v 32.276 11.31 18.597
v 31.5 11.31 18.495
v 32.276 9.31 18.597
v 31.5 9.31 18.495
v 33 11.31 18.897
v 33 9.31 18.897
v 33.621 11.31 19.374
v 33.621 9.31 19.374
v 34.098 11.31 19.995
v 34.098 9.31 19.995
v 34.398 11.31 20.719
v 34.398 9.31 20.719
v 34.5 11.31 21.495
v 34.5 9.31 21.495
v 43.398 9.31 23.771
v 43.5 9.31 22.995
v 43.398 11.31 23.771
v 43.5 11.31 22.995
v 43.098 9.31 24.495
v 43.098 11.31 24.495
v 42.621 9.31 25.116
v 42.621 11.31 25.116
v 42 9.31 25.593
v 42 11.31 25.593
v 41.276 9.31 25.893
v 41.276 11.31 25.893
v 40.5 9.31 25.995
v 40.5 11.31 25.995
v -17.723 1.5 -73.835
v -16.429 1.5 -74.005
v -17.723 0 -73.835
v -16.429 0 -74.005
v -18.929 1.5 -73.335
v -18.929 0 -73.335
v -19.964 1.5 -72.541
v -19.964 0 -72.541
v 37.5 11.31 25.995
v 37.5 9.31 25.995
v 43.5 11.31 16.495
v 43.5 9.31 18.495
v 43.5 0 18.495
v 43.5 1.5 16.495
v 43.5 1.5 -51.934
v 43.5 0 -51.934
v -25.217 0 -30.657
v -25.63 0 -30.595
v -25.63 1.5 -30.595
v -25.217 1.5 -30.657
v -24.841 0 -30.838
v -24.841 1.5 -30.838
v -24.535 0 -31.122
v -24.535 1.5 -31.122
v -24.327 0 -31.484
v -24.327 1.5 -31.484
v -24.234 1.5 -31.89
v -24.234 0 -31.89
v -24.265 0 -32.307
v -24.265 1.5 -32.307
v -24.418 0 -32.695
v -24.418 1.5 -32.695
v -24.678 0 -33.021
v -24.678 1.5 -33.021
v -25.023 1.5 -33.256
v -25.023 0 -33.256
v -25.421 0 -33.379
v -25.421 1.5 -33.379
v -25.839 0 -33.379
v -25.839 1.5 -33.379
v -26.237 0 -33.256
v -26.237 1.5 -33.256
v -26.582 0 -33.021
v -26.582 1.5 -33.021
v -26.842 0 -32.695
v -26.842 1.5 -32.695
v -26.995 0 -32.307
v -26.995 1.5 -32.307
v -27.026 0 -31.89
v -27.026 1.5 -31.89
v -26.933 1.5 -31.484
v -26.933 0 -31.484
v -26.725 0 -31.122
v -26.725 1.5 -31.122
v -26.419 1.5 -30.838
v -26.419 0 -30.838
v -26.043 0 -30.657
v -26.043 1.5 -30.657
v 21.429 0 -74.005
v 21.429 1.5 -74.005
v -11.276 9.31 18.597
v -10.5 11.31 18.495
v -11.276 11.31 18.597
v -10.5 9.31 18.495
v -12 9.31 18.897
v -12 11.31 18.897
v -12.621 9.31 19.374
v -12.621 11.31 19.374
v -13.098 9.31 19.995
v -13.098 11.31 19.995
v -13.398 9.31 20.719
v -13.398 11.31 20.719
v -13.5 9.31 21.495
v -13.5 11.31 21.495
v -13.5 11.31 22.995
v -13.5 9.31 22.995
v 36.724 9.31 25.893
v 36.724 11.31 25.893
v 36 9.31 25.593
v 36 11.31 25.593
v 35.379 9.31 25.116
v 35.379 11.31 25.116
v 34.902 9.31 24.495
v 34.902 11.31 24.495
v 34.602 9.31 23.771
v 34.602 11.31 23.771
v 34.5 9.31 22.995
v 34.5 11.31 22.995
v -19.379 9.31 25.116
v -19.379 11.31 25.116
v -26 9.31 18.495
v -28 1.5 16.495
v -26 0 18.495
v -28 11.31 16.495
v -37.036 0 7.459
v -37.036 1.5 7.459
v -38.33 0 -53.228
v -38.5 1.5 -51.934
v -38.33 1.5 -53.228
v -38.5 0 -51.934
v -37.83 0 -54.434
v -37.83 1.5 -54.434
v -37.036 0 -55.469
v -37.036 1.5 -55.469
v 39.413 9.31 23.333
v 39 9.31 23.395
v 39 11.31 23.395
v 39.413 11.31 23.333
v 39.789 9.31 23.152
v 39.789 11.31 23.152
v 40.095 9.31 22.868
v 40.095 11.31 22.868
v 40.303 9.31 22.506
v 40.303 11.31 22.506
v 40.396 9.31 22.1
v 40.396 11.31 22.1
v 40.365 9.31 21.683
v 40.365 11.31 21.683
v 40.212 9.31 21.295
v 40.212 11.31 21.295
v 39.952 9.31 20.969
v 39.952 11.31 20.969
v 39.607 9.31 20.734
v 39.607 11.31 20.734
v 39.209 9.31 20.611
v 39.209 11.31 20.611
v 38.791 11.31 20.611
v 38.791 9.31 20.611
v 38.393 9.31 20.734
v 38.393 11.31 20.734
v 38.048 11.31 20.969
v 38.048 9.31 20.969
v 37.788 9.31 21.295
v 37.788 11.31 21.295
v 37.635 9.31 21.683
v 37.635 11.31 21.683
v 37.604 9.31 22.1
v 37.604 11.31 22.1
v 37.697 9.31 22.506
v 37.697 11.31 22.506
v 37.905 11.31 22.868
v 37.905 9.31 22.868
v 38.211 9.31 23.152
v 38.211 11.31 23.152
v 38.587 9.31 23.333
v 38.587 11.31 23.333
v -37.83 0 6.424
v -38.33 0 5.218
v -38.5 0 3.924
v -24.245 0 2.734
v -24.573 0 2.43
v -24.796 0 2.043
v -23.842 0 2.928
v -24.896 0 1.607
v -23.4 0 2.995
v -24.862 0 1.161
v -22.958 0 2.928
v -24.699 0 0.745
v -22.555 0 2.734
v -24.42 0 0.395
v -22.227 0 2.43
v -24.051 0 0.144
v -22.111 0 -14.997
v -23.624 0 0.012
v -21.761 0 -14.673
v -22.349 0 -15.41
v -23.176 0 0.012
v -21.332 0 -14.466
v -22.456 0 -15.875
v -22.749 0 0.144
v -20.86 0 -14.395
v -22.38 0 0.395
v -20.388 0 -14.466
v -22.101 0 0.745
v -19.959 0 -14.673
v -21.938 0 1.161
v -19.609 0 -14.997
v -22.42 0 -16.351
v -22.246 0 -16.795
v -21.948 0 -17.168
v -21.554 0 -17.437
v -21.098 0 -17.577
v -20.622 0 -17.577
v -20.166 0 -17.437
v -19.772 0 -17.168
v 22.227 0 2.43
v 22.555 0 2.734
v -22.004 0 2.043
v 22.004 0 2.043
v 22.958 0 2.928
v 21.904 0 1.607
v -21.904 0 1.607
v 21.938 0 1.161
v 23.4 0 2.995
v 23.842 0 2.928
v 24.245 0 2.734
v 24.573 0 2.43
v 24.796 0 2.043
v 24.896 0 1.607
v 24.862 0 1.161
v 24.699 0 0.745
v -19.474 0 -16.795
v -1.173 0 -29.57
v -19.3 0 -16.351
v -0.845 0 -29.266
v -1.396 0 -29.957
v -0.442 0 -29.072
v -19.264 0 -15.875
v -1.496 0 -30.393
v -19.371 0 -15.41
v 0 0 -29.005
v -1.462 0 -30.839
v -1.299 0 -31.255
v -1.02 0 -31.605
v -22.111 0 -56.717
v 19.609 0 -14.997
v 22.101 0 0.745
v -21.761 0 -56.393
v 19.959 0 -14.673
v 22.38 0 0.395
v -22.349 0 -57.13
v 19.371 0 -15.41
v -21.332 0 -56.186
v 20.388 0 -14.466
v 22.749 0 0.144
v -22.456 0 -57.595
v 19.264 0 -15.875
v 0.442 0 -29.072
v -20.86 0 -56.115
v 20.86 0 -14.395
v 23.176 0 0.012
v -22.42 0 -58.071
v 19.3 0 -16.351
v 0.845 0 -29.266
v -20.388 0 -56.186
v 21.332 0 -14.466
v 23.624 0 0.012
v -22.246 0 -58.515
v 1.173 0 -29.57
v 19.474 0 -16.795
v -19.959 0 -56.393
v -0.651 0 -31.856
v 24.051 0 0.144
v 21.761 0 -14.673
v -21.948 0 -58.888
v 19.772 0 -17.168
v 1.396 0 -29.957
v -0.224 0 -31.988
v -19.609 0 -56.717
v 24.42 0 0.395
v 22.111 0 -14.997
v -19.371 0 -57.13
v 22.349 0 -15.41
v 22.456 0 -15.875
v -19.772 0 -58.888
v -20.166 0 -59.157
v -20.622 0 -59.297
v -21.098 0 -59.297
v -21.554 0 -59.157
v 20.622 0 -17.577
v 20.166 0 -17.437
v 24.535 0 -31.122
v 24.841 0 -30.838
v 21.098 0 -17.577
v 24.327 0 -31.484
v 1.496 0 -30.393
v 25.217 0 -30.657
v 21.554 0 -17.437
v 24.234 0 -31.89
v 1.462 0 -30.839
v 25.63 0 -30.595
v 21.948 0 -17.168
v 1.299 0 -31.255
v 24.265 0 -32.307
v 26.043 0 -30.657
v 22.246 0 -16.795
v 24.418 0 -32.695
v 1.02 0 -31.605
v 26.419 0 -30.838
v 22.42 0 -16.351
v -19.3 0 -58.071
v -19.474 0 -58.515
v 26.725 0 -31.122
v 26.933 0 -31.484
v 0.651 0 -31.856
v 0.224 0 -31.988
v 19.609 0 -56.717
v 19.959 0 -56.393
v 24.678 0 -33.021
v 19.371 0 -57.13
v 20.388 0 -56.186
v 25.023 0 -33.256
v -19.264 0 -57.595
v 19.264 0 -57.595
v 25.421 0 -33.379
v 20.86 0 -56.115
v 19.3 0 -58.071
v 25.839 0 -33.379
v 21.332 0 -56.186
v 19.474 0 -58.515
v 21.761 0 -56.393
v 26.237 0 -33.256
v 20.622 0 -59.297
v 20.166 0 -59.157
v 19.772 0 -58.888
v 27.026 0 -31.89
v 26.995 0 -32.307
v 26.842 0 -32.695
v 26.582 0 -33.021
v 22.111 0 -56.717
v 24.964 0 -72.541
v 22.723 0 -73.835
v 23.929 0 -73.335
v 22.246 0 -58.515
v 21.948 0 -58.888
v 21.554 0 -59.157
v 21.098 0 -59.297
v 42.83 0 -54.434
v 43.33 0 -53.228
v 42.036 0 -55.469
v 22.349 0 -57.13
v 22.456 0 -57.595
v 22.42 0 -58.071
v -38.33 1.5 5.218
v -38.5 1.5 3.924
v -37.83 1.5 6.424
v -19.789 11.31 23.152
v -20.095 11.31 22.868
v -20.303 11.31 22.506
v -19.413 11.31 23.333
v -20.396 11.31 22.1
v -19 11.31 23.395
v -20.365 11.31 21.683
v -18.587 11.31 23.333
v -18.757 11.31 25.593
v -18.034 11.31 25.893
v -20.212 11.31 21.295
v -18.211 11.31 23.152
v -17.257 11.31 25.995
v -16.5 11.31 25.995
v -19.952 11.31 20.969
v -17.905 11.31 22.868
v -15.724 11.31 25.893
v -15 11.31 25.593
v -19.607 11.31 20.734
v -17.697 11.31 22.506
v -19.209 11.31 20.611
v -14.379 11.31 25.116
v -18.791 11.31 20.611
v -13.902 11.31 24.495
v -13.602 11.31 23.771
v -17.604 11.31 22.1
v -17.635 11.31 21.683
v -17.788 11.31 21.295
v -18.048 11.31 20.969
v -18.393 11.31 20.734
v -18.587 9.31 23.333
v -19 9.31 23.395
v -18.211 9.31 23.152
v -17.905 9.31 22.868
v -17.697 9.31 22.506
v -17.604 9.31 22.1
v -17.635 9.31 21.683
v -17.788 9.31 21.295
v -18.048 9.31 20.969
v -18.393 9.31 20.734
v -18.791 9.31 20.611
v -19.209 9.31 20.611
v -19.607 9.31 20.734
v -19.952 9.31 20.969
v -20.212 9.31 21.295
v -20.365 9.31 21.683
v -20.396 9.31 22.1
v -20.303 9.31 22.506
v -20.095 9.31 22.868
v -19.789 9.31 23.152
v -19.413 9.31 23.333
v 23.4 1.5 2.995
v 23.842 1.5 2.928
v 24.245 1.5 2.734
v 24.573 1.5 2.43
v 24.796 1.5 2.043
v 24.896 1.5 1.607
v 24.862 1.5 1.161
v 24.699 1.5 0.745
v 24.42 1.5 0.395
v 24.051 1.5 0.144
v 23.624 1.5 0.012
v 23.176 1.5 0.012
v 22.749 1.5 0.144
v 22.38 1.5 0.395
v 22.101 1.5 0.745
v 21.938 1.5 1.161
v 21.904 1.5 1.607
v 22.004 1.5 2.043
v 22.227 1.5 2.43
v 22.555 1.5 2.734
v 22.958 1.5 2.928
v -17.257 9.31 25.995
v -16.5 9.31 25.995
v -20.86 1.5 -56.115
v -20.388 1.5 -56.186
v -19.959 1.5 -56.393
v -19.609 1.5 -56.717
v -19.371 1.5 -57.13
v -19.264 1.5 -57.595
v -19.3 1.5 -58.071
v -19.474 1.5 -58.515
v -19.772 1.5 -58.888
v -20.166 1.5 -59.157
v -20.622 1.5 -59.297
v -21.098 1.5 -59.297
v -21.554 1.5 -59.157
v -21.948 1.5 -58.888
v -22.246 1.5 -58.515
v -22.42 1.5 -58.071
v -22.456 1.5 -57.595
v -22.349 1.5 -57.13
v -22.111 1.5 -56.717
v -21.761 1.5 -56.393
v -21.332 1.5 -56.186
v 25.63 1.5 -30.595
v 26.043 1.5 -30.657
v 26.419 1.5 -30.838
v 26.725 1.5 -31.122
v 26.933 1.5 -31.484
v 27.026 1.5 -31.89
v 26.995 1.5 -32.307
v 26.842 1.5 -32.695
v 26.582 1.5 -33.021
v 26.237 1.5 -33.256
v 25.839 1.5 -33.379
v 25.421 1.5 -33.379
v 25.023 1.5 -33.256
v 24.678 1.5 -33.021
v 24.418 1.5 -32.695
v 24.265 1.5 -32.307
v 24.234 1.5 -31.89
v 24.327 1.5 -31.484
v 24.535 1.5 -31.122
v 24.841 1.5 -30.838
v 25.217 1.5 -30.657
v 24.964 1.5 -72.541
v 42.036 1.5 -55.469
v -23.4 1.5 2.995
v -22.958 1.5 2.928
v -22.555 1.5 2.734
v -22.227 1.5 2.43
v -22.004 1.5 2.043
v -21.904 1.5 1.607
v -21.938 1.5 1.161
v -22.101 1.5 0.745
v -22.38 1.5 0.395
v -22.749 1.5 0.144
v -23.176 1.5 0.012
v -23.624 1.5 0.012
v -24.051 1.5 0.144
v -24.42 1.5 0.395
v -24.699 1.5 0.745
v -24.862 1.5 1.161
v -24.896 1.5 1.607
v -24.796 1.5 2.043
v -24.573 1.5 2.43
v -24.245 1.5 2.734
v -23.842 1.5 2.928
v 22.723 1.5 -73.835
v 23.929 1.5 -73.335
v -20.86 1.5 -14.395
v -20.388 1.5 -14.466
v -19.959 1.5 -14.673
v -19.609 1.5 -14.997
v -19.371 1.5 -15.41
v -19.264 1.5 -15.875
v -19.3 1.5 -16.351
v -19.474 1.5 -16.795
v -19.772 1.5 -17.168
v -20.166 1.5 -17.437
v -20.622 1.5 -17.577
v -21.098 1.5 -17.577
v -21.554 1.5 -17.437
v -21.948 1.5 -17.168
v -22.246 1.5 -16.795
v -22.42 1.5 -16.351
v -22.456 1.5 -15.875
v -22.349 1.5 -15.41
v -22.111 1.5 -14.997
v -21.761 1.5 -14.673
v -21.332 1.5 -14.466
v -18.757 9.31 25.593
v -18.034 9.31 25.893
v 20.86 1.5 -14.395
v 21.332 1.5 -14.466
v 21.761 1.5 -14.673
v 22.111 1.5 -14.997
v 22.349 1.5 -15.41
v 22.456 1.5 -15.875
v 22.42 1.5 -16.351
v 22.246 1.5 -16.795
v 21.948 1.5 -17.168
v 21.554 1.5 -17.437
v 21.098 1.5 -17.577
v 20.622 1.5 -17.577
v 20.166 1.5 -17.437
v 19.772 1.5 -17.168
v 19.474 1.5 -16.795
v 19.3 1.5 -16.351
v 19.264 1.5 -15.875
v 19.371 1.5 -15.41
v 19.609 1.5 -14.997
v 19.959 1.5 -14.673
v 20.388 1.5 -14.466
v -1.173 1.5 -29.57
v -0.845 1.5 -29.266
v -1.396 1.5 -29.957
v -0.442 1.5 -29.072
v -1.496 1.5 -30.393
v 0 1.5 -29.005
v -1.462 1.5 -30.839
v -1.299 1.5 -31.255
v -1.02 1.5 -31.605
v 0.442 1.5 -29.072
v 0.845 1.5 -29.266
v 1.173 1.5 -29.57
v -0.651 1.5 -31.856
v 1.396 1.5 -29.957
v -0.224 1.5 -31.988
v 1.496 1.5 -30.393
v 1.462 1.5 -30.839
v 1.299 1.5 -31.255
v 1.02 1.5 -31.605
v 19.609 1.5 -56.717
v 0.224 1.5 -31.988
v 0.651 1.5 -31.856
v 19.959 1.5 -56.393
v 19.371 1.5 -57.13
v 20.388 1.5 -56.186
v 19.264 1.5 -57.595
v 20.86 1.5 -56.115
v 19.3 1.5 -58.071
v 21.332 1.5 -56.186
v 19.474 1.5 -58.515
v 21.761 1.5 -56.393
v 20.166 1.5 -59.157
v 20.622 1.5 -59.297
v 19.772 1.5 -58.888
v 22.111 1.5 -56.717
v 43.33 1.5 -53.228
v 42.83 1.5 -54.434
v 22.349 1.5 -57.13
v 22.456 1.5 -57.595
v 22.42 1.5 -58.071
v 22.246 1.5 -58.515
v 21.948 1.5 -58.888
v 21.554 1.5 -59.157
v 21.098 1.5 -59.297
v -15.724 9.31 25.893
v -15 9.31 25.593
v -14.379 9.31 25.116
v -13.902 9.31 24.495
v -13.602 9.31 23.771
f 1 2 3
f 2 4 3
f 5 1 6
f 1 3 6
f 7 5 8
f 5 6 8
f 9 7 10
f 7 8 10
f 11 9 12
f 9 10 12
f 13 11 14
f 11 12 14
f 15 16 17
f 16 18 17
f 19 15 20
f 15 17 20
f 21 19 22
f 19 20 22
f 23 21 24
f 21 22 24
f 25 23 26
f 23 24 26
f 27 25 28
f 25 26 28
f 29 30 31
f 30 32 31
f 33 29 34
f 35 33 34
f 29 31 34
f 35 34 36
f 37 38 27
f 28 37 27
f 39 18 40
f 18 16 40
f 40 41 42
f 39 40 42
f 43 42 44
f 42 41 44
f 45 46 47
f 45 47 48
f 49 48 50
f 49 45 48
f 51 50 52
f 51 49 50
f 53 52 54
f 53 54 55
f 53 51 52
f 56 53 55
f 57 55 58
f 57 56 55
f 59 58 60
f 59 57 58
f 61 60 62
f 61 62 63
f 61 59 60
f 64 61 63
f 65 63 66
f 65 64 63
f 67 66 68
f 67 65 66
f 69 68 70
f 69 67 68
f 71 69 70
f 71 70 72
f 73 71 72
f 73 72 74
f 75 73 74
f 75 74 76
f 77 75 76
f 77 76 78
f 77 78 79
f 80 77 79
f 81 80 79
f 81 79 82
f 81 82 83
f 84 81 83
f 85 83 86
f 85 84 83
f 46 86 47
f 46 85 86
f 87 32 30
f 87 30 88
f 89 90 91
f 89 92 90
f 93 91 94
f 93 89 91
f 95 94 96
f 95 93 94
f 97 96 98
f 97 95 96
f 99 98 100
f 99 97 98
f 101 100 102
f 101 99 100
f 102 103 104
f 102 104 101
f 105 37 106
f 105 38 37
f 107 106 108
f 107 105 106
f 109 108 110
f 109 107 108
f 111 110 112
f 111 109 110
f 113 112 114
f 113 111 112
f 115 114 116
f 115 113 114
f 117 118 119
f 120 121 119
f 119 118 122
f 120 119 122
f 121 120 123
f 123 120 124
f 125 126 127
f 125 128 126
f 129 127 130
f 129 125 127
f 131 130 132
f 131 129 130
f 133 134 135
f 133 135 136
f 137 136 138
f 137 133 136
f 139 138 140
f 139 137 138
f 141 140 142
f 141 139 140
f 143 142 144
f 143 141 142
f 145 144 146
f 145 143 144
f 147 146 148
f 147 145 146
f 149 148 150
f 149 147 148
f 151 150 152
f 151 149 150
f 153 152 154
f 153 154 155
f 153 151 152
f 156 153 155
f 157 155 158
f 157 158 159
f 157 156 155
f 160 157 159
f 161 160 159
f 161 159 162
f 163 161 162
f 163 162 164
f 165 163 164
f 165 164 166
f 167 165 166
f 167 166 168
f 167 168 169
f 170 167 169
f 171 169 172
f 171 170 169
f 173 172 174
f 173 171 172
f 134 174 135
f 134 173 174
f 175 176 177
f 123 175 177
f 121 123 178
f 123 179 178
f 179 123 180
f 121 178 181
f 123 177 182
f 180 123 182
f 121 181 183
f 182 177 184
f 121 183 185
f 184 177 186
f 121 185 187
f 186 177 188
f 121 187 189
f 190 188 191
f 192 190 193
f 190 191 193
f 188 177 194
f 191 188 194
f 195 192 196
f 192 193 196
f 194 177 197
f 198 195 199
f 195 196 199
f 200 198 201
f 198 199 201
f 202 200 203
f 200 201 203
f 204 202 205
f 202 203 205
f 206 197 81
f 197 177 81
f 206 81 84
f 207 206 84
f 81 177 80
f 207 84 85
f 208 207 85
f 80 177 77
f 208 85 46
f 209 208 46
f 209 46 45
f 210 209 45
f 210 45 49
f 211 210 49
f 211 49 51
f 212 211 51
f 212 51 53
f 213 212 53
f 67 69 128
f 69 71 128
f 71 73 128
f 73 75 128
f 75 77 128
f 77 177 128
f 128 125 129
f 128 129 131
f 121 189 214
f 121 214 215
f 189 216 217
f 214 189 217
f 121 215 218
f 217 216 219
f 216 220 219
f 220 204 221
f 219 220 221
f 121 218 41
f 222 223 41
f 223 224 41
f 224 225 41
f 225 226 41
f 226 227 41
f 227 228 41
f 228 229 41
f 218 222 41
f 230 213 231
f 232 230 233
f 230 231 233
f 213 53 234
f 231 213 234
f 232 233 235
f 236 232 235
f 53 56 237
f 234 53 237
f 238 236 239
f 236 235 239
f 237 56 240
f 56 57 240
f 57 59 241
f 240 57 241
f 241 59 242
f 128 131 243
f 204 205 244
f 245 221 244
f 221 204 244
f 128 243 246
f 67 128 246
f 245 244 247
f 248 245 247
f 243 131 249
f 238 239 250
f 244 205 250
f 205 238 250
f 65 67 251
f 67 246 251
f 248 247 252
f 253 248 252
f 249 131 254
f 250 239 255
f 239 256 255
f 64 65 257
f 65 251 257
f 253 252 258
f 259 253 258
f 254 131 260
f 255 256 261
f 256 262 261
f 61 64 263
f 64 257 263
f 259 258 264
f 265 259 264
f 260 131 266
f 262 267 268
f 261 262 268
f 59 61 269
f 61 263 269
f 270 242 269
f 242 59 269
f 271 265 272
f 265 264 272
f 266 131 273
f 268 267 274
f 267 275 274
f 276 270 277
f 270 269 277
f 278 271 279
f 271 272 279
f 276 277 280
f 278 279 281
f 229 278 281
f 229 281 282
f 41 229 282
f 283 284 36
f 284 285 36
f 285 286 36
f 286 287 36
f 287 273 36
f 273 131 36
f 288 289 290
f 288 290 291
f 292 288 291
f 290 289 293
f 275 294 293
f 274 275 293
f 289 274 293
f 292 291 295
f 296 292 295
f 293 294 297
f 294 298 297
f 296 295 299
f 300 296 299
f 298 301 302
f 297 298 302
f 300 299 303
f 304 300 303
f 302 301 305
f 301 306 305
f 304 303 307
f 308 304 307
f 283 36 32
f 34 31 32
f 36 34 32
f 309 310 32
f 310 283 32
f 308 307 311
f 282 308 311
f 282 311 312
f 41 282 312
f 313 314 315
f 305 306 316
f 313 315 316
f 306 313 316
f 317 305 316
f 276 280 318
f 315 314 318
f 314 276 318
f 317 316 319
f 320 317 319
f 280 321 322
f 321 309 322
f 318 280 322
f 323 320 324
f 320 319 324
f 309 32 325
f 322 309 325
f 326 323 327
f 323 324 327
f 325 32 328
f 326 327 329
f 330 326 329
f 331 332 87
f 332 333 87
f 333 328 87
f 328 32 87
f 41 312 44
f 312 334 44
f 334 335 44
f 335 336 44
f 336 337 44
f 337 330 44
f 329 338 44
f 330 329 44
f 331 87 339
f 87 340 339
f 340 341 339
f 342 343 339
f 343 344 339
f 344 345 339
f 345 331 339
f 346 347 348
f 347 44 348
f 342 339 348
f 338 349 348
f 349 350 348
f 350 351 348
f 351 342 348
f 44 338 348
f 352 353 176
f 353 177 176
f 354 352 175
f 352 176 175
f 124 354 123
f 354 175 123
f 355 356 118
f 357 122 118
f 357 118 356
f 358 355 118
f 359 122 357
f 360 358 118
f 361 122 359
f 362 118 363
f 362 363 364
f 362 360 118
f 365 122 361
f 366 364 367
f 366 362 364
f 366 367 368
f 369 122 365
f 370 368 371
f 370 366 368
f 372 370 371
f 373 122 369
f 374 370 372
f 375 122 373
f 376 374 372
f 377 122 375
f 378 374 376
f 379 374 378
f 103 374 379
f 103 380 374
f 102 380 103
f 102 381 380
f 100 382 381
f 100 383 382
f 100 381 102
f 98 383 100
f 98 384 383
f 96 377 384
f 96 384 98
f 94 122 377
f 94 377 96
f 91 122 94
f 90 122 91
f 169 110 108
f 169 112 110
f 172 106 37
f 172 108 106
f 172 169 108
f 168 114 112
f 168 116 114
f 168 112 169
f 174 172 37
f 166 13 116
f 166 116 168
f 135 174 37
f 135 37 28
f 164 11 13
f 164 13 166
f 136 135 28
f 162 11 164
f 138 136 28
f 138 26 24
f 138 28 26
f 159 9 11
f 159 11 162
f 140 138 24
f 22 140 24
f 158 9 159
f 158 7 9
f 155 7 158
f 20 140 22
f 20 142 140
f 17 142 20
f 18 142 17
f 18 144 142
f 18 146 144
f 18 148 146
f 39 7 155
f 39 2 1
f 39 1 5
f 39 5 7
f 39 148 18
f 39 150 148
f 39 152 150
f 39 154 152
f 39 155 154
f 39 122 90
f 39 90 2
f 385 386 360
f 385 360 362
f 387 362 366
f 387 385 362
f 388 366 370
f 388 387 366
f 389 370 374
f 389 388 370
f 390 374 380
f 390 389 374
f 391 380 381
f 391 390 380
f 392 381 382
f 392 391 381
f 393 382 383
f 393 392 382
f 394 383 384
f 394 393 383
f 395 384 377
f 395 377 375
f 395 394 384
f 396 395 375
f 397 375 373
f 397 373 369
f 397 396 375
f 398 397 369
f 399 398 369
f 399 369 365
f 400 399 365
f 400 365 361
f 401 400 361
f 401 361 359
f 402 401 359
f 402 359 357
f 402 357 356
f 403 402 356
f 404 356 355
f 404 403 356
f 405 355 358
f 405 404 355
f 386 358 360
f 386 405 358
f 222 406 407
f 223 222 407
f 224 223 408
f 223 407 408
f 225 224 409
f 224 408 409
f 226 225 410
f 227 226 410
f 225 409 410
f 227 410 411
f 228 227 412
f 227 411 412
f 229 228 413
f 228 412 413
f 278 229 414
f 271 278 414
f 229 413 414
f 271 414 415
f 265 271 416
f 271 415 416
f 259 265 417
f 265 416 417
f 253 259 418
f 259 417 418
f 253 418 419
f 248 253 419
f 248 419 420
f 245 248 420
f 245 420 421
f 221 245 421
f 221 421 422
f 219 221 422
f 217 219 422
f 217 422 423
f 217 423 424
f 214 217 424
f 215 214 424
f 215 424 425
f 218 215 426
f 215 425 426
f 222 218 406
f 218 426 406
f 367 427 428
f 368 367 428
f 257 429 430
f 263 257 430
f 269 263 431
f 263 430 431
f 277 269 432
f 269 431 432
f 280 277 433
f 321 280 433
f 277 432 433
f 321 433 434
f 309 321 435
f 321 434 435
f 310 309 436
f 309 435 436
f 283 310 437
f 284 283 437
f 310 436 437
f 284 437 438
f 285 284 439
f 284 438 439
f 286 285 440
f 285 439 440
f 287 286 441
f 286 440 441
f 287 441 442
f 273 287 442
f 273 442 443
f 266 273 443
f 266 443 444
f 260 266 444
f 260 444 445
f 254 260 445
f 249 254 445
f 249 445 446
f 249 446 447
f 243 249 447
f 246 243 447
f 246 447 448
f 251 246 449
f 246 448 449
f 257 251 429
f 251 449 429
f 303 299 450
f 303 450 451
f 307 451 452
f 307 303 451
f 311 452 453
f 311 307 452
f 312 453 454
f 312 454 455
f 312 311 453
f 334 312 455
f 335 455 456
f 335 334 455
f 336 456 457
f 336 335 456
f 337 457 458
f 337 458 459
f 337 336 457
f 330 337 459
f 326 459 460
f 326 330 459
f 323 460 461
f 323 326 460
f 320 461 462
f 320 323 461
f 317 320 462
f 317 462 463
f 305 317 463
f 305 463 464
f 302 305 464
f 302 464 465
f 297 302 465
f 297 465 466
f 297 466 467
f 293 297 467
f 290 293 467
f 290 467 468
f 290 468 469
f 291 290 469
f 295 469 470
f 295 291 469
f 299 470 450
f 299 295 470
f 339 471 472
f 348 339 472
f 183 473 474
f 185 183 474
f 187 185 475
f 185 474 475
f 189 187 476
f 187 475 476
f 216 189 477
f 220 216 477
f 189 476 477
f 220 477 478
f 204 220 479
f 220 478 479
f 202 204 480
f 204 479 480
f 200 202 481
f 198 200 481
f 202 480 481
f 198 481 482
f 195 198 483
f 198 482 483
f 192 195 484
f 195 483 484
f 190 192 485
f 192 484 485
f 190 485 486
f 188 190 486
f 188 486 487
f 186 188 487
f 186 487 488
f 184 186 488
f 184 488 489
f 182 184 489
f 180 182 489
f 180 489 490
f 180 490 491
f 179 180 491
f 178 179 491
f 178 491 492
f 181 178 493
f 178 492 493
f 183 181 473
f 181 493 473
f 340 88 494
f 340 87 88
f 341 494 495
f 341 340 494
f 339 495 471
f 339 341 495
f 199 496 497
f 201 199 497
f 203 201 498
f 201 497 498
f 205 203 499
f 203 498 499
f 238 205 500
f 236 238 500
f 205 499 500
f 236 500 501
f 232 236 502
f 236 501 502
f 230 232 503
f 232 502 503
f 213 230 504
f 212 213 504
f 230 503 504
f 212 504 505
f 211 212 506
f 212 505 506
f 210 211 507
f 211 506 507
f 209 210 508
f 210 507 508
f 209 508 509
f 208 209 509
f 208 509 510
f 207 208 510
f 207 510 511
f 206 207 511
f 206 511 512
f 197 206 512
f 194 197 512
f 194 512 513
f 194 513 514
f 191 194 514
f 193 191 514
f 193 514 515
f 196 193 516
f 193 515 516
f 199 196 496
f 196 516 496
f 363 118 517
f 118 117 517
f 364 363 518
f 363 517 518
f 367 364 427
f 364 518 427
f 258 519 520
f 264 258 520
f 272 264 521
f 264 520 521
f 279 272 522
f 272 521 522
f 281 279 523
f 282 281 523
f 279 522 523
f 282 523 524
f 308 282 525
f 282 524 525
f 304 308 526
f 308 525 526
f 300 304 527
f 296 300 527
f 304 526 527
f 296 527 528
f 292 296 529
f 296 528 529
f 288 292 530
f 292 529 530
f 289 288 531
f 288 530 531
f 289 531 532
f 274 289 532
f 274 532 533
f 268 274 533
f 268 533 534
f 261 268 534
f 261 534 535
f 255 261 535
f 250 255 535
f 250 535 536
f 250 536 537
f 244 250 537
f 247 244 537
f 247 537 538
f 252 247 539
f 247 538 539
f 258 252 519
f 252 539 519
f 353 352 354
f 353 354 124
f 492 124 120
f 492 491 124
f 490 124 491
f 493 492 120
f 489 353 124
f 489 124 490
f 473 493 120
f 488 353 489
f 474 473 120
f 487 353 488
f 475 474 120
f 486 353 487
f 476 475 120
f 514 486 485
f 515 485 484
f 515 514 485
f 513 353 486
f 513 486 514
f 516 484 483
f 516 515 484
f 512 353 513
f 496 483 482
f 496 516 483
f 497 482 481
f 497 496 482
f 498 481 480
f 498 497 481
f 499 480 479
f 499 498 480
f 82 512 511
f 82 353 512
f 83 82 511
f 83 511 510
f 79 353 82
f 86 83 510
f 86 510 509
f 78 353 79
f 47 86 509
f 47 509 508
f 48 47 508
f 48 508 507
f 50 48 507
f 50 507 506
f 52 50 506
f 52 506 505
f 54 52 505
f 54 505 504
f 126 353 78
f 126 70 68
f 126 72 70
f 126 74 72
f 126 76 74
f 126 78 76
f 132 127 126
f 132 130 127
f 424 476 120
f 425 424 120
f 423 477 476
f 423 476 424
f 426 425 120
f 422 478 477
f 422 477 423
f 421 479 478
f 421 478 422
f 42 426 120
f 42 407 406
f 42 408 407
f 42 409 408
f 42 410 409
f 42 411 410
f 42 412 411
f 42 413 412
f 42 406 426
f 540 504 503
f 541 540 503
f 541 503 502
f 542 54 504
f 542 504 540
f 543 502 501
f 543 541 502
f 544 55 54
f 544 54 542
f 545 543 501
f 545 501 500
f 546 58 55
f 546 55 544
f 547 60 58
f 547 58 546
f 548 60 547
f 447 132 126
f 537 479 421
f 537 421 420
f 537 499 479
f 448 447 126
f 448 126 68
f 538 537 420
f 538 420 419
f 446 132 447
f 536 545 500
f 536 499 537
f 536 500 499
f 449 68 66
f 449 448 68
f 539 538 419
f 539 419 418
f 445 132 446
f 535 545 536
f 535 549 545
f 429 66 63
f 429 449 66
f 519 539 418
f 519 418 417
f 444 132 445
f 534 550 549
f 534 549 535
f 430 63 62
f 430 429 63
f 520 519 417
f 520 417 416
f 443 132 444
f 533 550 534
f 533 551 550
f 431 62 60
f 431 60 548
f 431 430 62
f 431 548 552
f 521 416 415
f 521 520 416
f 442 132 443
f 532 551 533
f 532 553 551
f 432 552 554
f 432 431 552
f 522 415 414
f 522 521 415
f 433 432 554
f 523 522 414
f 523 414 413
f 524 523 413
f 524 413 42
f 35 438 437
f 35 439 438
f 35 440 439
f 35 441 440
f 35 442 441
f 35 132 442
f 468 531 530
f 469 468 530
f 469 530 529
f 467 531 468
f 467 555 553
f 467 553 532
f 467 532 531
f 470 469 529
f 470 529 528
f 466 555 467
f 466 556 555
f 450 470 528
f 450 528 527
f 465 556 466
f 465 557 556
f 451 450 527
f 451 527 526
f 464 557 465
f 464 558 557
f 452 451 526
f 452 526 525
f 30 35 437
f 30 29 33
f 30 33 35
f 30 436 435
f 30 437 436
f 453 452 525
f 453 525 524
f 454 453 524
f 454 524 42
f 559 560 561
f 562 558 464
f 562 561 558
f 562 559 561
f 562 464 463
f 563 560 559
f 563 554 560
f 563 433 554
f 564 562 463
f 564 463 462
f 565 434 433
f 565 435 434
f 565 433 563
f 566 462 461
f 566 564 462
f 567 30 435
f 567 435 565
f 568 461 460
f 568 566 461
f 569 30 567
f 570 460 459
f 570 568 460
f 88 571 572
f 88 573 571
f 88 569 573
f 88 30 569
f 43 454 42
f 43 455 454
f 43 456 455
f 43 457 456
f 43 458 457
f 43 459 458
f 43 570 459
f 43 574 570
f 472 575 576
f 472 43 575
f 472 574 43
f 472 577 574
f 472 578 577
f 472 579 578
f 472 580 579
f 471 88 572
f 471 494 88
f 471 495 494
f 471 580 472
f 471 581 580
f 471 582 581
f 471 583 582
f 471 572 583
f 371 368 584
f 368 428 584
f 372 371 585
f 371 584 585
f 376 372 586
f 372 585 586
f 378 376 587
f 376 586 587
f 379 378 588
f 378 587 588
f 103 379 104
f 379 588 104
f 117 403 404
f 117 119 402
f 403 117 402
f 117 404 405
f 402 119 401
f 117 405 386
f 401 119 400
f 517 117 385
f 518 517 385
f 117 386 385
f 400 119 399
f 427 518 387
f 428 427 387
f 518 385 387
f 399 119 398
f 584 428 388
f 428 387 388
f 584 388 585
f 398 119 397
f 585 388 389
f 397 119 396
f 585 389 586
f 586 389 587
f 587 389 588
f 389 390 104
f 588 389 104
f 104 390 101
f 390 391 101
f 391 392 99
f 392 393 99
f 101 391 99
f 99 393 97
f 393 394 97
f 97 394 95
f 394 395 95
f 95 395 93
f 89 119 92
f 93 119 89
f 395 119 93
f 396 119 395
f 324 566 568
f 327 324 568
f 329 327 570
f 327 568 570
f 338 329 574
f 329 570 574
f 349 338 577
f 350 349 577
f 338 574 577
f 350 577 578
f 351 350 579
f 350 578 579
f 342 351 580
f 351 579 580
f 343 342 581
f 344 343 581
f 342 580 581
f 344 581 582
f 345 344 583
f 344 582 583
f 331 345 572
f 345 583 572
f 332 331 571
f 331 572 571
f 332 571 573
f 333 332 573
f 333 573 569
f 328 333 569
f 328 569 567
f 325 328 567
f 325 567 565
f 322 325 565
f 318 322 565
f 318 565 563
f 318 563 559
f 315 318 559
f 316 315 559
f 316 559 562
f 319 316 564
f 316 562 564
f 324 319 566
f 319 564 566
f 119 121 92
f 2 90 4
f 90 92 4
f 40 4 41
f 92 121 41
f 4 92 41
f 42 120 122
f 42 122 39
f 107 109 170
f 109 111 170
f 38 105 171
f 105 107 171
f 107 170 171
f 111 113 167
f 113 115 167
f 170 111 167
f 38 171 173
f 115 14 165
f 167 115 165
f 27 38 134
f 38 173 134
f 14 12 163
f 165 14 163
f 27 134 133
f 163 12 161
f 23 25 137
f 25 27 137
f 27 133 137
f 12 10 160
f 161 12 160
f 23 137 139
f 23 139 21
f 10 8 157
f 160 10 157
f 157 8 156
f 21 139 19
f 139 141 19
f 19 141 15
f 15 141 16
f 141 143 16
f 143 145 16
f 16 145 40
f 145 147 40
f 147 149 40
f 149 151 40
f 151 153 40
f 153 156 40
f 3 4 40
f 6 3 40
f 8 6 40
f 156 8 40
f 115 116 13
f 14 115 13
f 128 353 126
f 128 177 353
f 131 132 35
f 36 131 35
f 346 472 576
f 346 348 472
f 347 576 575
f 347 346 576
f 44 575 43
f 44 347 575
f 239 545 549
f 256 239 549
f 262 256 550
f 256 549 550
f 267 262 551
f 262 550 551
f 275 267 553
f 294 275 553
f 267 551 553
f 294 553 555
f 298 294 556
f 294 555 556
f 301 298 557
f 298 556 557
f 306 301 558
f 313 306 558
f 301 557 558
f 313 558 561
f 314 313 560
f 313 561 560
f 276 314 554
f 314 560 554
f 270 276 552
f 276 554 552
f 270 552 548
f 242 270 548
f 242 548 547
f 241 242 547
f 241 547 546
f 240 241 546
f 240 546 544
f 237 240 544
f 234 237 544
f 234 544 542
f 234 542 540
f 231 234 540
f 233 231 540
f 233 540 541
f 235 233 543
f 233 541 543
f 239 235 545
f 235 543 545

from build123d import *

# Parameters (mm, degrees)
CROQUIS1_W              = 82
CROQUIS1_H              = 90.5
CROQUIS1_R              = 1.4
SALIENTE_EXTRUIR1_DEPTH = 1.5
CROQUIS1_3_W            = 82
CROQUIS1_3_H            = 2
SALIENTE_EXTRUIR2_DEPTH = 9.31
SALIENTE_EXTRUIR3_START = 9.31
CROQUIS1_4_W            = 82
CROQUIS1_4_H            = 7.5
CROQUIS1_4_R            = 1.4
CROQUIS1_4_H_2          = 2
SALIENTE_EXTRUIR3_DEPTH = 2
CROQUIS2_R              = 1.5
CROQUIS2_R_2            = 1.6
CORTAR_EXTRUIR1_DEPTH   = 1.5
CROQUIS3_W              = 48
CROQUIS3_H              = 7.5
CORTAR_EXTRUIR2_DEPTH   = 87.58467604
REDONDEO1_R             = 5
REDONDEO2_R             = 3


with BuildPart() as part:
    # Croquis1 → Saliente-Extruir1 (new body)
    with BuildSketch(Plane(origin=(0, 0, 0), x_dir=(1, 0, 0), z_dir=(0, 1, 0))):
        with Locations((2.5, 28.755)):
            Rectangle(CROQUIS1_W, CROQUIS1_H)
        with Locations(Location((-25.63, 31.995, 0), (0, 0, 270))):
            Circle(CROQUIS1_R, mode=Mode.SUBTRACT)
        with Locations(Location((25.63, 31.995, 0), (0, 0, 270))):
            Circle(CROQUIS1_R, mode=Mode.SUBTRACT)
    extrude(amount=SALIENTE_EXTRUIR1_DEPTH)

    # Croquis2 → Cortar-Extruir1 (cut)
    with BuildSketch(Plane(origin=(0, 1.5, 0), x_dir=(1, 0, 0), z_dir=(0, 1, 0))):
        with Locations(Location((-23.4, -1.495, 0), (0, 0, 270))):
            Circle(CROQUIS2_R)
        with Locations(Location((23.4, -1.495, 0), (0, 0, 270))):
            Circle(CROQUIS2_R)
        with Locations(Location((0, 30.505, 0), (0, 0, 270))):
            Circle(CROQUIS2_R)
        with Locations(Location((-20.86, 57.715, 0), (0, 0, 270))):
            Circle(CROQUIS2_R_2)
        with Locations(Location((20.86, 57.715, 0), (0, 0, 270))):
            Circle(CROQUIS2_R_2)
        with Locations(Location((20.86, 15.995, 0), (0, 0, 270))):
            Circle(CROQUIS2_R_2)
        with Locations(Location((-20.86, 15.995, 0), (0, 0, 270))):
            Circle(CROQUIS2_R_2)
    extrude(amount=-CORTAR_EXTRUIR1_DEPTH, mode=Mode.SUBTRACT)


with BuildPart() as body_2:
    # Croquis1<3> → Saliente-Extruir2 (new body)
    with BuildSketch(Plane(origin=(0, 0, 0), x_dir=(1, 0, 0), z_dir=(0, 1, 0))):
        with Locations((2.5, -17.495)):
            Rectangle(CROQUIS1_3_W, CROQUIS1_3_H)
    extrude(amount=SALIENTE_EXTRUIR2_DEPTH)

    # Croquis1<4> → Saliente-Extruir3 (add)
    # profile 1 of 2: a face of its own
    with BuildSketch(Plane(origin=(0, 0, 0), x_dir=(1, 0, 0), z_dir=(0, 1, 0)).offset(SALIENTE_EXTRUIR3_START)):
        with Locations((2.5, -22.245)):
            Rectangle(CROQUIS1_4_W, CROQUIS1_4_H)
        with Locations(Location((-19, -21.995, 0), (0, 0, 270))):
            Circle(CROQUIS1_4_R, mode=Mode.SUBTRACT)
        with Locations(Location((39, -21.995, 0), (0, 0, 270))):
            Circle(CROQUIS1_4_R, mode=Mode.SUBTRACT)
    # profile 2 of 2: a face of its own
    with BuildSketch(Plane(origin=(0, 0, 0), x_dir=(1, 0, 0), z_dir=(0, 1, 0)).offset(SALIENTE_EXTRUIR3_START)):
        with Locations((2.5, -17.495)):
            Rectangle(CROQUIS1_4_W, CROQUIS1_4_H_2)
    extrude(amount=SALIENTE_EXTRUIR3_DEPTH)

    # Combinar1: union part
    add(part.part)

    # Croquis3 → Cortar-Extruir2 (cut, through all)
    with BuildSketch(Plane(origin=(0, 11.31, 0), x_dir=(1, 0, 0), z_dir=(0, 1, 0))):
        Polygon((-18.5, -25.995), (-28, -16.495), (-38.5, -16.495), (-38.5, -25.995), align=None)
        Polygon((-28, -16.495), (-38.5, -5.995), (-38.5, -16.495), align=None)
        with Locations((10.5, -22.245)):
            Rectangle(CROQUIS3_W, CROQUIS3_H)
        Polygon((-38.5, 54.005), (-18.5, 74.005), (-38.5, 74.005), align=None)
        Polygon((23.5, 74.005), (43.5, 54.005), (43.5, 74.005), align=None)
    extrude(amount=-CORTAR_EXTRUIR2_DEPTH, mode=Mode.SUBTRACT)

    # Redondeo1
    redondeo1_edges = [body_2.edges().sort_by_distance(p)[0] for p in [
        (23.5, 0.75, -74.005),
        (43.5, 0.75, -54.005),
        (-38.5, 0.75, 5.995),
        (-18.5, 0.75, -74.005),
        (-38.5, 0.75, -54.005),
    ]]
    fillet(redondeo1_edges, radius=REDONDEO1_R)

    # Redondeo2
    redondeo2_edges = [body_2.edges().sort_by_distance(p)[0] for p in [
        (-18.5, 10.31, 25.995),
        (43.5, 10.31, 25.995),
        (34.5, 10.31, 18.495),
        (-13.5, 10.31, 25.995),
        (-13.5, 10.31, 18.495),
        (34.5, 10.31, 25.995),
    ]]
    fillet(redondeo2_edges, radius=REDONDEO2_R)


solid = body_2.part
